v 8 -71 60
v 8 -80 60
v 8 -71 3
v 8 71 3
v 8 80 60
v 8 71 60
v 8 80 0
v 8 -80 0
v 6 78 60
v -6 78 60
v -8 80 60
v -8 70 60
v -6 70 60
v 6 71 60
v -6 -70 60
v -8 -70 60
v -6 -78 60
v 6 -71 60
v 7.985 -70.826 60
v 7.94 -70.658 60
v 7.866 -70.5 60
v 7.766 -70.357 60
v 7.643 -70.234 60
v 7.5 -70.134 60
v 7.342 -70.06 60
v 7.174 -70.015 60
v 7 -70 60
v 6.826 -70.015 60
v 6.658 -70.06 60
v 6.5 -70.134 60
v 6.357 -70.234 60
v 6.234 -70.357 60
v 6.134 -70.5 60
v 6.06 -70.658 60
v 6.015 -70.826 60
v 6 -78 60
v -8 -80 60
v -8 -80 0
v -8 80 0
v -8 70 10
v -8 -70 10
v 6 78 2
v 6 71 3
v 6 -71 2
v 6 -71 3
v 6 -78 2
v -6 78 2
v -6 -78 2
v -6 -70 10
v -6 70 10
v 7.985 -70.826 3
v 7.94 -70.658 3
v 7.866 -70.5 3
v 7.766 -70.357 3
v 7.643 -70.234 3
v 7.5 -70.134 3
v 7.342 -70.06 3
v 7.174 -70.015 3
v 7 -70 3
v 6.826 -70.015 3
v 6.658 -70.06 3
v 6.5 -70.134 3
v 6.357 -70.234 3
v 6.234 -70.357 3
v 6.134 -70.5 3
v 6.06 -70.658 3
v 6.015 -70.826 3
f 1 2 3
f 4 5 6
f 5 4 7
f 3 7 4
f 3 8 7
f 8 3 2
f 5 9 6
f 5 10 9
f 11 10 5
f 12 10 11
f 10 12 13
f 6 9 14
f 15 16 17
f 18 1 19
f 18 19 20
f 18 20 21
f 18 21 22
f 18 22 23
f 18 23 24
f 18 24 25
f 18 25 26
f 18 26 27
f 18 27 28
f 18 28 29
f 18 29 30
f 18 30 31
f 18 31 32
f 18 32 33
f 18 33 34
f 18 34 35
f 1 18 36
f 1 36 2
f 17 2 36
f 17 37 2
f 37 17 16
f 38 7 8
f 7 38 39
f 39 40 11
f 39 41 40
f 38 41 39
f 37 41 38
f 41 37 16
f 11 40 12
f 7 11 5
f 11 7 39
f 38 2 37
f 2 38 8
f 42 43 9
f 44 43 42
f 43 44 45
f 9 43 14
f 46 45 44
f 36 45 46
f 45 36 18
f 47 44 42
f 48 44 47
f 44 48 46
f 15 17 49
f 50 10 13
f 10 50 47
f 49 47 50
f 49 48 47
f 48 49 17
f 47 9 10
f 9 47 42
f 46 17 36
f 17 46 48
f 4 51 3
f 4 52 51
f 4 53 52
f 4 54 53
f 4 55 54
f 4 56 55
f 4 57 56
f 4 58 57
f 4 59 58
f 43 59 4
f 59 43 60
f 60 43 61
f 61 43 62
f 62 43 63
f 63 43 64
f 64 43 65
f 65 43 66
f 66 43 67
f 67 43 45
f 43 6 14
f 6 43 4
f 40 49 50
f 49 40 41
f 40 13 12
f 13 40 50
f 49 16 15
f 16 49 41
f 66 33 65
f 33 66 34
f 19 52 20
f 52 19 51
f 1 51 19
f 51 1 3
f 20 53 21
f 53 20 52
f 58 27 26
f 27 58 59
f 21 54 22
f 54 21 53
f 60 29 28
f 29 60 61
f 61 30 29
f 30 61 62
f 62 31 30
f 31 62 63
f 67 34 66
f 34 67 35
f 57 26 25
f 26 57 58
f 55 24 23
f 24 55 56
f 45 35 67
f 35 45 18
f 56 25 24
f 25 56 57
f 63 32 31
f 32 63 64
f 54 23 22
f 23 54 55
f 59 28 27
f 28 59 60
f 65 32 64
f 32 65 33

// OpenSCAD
// Definition size of housing
// **************************

sizex = 51;
sizey = 51;
depth = 10;
thick = 2;
gap=2.5;

//Definition of circle angular resolution
$fn = 36;  


union () {
 difference () {
 
   // main block
   translate ([0,0,30]) {
     cube ( [16,160,60], center = true );
   };
     
   //remove inner
   translate ([0,0,32]) {
   cube ( [12,156,60], center = true);
   };
   translate ([2,0,33]) {
   cube ( [14,142,60], center = true);
   };
   translate ([-2,0,35]) {
   cube ( [14,140,50], center = true);
   };
         
 };      
 
 //add support fins
 
   translate ([7,-71,0]) {
   cylinder (60,1,true);
   };

 
}
